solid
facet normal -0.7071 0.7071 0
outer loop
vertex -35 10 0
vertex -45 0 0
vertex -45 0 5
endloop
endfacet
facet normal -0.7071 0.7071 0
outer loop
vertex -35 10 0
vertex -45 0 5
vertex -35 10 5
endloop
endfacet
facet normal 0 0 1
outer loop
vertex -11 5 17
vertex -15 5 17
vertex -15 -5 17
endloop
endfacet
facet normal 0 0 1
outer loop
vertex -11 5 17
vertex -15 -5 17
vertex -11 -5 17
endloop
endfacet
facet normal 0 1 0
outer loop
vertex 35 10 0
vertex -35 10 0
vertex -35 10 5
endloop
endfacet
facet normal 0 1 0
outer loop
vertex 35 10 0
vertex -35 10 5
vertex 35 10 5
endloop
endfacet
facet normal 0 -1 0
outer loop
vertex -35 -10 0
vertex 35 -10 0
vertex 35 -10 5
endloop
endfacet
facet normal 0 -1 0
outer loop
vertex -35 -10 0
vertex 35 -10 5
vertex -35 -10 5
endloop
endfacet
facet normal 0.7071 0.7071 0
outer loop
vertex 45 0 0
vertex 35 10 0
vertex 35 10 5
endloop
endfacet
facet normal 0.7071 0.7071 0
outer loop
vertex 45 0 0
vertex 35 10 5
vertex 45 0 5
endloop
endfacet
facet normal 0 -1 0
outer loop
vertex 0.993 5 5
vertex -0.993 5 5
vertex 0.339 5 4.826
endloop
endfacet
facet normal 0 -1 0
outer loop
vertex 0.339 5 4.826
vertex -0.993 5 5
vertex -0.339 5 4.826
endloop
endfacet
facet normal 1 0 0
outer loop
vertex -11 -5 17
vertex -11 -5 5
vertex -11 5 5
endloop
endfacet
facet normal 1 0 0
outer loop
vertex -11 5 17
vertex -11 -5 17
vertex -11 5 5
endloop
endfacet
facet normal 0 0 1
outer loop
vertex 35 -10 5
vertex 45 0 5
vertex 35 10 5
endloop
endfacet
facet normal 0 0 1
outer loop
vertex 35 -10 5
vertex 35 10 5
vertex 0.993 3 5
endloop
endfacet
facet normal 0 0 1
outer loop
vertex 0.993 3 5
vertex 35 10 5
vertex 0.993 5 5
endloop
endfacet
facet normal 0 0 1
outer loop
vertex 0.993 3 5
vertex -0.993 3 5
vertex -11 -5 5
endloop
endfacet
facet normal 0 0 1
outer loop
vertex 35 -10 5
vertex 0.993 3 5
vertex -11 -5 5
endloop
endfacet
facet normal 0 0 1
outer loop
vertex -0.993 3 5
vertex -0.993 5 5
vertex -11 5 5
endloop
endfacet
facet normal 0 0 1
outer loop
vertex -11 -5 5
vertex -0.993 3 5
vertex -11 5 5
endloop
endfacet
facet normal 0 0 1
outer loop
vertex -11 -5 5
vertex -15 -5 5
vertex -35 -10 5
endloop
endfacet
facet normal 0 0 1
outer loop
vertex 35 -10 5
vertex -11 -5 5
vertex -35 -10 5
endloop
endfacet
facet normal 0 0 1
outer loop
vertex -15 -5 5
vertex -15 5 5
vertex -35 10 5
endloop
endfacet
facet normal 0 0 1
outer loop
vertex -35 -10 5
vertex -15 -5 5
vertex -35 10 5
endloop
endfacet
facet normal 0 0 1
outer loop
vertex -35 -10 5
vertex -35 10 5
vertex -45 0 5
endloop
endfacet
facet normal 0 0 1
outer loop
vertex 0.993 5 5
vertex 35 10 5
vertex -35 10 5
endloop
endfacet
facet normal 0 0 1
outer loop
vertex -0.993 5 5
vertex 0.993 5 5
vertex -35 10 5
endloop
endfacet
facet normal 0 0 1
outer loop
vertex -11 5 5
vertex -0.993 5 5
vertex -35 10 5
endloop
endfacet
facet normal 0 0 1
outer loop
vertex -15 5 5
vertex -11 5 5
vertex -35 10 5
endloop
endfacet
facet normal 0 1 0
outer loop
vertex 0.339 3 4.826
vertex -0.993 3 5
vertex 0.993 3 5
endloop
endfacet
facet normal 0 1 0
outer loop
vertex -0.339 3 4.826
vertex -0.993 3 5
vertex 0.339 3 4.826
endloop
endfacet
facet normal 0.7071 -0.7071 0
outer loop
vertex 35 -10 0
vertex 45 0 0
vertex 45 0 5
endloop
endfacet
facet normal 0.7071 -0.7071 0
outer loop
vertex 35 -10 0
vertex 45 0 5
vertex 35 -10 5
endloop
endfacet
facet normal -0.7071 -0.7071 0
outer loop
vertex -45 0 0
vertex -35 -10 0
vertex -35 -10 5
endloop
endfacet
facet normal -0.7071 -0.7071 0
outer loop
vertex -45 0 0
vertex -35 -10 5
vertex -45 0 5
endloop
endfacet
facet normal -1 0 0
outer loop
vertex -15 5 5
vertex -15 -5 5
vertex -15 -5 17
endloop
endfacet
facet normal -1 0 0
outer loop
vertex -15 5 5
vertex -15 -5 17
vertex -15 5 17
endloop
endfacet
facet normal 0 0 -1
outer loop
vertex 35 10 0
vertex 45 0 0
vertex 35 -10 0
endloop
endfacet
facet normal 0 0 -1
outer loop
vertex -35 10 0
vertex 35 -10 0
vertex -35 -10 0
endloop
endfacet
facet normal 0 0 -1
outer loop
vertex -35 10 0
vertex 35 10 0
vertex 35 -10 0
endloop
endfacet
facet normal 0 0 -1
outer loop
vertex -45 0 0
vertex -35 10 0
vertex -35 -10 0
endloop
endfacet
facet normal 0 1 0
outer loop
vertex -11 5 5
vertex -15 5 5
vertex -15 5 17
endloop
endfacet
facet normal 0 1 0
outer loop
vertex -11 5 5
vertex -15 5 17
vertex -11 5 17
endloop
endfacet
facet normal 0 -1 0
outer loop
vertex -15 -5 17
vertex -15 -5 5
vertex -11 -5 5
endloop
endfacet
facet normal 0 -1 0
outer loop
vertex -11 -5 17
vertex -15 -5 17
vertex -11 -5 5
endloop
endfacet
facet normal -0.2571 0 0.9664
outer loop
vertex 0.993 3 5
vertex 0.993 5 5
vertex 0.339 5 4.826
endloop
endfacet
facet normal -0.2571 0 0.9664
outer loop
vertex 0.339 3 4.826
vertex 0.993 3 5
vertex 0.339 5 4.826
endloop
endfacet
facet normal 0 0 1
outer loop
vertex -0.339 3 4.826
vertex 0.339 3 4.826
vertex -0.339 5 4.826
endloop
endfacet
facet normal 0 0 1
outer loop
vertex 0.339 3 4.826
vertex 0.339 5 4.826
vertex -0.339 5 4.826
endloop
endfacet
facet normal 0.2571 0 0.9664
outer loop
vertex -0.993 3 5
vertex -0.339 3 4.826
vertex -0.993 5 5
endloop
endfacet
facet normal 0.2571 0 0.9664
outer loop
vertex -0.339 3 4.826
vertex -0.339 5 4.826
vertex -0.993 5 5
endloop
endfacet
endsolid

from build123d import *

# Parameters (mm, degrees)
PAD_DEPTH    = 5
SKETCH001_W  = 4
SKETCH001_H  = 10
PAD001_DEPTH = 12
POCKET_DEPTH = 2


with BuildPart() as part:
    # Sketch → Pad (new body)
    with BuildSketch(Plane.XY):
        Polygon((-35, 10), (35, 10), (45, 0), (35, -10), (-35, -10), (-45, 0), align=None)
    extrude(amount=PAD_DEPTH)

    # Sketch001 (on Face8 of Pad) → Pad001 (join)
    with BuildSketch(Plane.XY.offset(5)):
        with Locations((-13, 0)):
            Rectangle(SKETCH001_W, SKETCH001_H)
    extrude(amount=PAD001_DEPTH)

    # Sketch002 (on Face12 of Pad001) → Pocket (cut)
    with BuildSketch(Plane(origin=(0, 5, 0), x_dir=(-1, 0, 0), z_dir=(0, 1, 0))):
        with BuildLine():
            Line((-3.4, 17), (3.4, 17))
            Line((3.4, 17), (2.6, 7.2))
            ThreePointArc((-2.6, 7.2), (0, 4.803596), (2.6, 7.2))
            Line((-3.4, 17), (-2.6, 7.2))
        make_face()
    extrude(amount=-POCKET_DEPTH, mode=Mode.SUBTRACT)


solid = part.part
